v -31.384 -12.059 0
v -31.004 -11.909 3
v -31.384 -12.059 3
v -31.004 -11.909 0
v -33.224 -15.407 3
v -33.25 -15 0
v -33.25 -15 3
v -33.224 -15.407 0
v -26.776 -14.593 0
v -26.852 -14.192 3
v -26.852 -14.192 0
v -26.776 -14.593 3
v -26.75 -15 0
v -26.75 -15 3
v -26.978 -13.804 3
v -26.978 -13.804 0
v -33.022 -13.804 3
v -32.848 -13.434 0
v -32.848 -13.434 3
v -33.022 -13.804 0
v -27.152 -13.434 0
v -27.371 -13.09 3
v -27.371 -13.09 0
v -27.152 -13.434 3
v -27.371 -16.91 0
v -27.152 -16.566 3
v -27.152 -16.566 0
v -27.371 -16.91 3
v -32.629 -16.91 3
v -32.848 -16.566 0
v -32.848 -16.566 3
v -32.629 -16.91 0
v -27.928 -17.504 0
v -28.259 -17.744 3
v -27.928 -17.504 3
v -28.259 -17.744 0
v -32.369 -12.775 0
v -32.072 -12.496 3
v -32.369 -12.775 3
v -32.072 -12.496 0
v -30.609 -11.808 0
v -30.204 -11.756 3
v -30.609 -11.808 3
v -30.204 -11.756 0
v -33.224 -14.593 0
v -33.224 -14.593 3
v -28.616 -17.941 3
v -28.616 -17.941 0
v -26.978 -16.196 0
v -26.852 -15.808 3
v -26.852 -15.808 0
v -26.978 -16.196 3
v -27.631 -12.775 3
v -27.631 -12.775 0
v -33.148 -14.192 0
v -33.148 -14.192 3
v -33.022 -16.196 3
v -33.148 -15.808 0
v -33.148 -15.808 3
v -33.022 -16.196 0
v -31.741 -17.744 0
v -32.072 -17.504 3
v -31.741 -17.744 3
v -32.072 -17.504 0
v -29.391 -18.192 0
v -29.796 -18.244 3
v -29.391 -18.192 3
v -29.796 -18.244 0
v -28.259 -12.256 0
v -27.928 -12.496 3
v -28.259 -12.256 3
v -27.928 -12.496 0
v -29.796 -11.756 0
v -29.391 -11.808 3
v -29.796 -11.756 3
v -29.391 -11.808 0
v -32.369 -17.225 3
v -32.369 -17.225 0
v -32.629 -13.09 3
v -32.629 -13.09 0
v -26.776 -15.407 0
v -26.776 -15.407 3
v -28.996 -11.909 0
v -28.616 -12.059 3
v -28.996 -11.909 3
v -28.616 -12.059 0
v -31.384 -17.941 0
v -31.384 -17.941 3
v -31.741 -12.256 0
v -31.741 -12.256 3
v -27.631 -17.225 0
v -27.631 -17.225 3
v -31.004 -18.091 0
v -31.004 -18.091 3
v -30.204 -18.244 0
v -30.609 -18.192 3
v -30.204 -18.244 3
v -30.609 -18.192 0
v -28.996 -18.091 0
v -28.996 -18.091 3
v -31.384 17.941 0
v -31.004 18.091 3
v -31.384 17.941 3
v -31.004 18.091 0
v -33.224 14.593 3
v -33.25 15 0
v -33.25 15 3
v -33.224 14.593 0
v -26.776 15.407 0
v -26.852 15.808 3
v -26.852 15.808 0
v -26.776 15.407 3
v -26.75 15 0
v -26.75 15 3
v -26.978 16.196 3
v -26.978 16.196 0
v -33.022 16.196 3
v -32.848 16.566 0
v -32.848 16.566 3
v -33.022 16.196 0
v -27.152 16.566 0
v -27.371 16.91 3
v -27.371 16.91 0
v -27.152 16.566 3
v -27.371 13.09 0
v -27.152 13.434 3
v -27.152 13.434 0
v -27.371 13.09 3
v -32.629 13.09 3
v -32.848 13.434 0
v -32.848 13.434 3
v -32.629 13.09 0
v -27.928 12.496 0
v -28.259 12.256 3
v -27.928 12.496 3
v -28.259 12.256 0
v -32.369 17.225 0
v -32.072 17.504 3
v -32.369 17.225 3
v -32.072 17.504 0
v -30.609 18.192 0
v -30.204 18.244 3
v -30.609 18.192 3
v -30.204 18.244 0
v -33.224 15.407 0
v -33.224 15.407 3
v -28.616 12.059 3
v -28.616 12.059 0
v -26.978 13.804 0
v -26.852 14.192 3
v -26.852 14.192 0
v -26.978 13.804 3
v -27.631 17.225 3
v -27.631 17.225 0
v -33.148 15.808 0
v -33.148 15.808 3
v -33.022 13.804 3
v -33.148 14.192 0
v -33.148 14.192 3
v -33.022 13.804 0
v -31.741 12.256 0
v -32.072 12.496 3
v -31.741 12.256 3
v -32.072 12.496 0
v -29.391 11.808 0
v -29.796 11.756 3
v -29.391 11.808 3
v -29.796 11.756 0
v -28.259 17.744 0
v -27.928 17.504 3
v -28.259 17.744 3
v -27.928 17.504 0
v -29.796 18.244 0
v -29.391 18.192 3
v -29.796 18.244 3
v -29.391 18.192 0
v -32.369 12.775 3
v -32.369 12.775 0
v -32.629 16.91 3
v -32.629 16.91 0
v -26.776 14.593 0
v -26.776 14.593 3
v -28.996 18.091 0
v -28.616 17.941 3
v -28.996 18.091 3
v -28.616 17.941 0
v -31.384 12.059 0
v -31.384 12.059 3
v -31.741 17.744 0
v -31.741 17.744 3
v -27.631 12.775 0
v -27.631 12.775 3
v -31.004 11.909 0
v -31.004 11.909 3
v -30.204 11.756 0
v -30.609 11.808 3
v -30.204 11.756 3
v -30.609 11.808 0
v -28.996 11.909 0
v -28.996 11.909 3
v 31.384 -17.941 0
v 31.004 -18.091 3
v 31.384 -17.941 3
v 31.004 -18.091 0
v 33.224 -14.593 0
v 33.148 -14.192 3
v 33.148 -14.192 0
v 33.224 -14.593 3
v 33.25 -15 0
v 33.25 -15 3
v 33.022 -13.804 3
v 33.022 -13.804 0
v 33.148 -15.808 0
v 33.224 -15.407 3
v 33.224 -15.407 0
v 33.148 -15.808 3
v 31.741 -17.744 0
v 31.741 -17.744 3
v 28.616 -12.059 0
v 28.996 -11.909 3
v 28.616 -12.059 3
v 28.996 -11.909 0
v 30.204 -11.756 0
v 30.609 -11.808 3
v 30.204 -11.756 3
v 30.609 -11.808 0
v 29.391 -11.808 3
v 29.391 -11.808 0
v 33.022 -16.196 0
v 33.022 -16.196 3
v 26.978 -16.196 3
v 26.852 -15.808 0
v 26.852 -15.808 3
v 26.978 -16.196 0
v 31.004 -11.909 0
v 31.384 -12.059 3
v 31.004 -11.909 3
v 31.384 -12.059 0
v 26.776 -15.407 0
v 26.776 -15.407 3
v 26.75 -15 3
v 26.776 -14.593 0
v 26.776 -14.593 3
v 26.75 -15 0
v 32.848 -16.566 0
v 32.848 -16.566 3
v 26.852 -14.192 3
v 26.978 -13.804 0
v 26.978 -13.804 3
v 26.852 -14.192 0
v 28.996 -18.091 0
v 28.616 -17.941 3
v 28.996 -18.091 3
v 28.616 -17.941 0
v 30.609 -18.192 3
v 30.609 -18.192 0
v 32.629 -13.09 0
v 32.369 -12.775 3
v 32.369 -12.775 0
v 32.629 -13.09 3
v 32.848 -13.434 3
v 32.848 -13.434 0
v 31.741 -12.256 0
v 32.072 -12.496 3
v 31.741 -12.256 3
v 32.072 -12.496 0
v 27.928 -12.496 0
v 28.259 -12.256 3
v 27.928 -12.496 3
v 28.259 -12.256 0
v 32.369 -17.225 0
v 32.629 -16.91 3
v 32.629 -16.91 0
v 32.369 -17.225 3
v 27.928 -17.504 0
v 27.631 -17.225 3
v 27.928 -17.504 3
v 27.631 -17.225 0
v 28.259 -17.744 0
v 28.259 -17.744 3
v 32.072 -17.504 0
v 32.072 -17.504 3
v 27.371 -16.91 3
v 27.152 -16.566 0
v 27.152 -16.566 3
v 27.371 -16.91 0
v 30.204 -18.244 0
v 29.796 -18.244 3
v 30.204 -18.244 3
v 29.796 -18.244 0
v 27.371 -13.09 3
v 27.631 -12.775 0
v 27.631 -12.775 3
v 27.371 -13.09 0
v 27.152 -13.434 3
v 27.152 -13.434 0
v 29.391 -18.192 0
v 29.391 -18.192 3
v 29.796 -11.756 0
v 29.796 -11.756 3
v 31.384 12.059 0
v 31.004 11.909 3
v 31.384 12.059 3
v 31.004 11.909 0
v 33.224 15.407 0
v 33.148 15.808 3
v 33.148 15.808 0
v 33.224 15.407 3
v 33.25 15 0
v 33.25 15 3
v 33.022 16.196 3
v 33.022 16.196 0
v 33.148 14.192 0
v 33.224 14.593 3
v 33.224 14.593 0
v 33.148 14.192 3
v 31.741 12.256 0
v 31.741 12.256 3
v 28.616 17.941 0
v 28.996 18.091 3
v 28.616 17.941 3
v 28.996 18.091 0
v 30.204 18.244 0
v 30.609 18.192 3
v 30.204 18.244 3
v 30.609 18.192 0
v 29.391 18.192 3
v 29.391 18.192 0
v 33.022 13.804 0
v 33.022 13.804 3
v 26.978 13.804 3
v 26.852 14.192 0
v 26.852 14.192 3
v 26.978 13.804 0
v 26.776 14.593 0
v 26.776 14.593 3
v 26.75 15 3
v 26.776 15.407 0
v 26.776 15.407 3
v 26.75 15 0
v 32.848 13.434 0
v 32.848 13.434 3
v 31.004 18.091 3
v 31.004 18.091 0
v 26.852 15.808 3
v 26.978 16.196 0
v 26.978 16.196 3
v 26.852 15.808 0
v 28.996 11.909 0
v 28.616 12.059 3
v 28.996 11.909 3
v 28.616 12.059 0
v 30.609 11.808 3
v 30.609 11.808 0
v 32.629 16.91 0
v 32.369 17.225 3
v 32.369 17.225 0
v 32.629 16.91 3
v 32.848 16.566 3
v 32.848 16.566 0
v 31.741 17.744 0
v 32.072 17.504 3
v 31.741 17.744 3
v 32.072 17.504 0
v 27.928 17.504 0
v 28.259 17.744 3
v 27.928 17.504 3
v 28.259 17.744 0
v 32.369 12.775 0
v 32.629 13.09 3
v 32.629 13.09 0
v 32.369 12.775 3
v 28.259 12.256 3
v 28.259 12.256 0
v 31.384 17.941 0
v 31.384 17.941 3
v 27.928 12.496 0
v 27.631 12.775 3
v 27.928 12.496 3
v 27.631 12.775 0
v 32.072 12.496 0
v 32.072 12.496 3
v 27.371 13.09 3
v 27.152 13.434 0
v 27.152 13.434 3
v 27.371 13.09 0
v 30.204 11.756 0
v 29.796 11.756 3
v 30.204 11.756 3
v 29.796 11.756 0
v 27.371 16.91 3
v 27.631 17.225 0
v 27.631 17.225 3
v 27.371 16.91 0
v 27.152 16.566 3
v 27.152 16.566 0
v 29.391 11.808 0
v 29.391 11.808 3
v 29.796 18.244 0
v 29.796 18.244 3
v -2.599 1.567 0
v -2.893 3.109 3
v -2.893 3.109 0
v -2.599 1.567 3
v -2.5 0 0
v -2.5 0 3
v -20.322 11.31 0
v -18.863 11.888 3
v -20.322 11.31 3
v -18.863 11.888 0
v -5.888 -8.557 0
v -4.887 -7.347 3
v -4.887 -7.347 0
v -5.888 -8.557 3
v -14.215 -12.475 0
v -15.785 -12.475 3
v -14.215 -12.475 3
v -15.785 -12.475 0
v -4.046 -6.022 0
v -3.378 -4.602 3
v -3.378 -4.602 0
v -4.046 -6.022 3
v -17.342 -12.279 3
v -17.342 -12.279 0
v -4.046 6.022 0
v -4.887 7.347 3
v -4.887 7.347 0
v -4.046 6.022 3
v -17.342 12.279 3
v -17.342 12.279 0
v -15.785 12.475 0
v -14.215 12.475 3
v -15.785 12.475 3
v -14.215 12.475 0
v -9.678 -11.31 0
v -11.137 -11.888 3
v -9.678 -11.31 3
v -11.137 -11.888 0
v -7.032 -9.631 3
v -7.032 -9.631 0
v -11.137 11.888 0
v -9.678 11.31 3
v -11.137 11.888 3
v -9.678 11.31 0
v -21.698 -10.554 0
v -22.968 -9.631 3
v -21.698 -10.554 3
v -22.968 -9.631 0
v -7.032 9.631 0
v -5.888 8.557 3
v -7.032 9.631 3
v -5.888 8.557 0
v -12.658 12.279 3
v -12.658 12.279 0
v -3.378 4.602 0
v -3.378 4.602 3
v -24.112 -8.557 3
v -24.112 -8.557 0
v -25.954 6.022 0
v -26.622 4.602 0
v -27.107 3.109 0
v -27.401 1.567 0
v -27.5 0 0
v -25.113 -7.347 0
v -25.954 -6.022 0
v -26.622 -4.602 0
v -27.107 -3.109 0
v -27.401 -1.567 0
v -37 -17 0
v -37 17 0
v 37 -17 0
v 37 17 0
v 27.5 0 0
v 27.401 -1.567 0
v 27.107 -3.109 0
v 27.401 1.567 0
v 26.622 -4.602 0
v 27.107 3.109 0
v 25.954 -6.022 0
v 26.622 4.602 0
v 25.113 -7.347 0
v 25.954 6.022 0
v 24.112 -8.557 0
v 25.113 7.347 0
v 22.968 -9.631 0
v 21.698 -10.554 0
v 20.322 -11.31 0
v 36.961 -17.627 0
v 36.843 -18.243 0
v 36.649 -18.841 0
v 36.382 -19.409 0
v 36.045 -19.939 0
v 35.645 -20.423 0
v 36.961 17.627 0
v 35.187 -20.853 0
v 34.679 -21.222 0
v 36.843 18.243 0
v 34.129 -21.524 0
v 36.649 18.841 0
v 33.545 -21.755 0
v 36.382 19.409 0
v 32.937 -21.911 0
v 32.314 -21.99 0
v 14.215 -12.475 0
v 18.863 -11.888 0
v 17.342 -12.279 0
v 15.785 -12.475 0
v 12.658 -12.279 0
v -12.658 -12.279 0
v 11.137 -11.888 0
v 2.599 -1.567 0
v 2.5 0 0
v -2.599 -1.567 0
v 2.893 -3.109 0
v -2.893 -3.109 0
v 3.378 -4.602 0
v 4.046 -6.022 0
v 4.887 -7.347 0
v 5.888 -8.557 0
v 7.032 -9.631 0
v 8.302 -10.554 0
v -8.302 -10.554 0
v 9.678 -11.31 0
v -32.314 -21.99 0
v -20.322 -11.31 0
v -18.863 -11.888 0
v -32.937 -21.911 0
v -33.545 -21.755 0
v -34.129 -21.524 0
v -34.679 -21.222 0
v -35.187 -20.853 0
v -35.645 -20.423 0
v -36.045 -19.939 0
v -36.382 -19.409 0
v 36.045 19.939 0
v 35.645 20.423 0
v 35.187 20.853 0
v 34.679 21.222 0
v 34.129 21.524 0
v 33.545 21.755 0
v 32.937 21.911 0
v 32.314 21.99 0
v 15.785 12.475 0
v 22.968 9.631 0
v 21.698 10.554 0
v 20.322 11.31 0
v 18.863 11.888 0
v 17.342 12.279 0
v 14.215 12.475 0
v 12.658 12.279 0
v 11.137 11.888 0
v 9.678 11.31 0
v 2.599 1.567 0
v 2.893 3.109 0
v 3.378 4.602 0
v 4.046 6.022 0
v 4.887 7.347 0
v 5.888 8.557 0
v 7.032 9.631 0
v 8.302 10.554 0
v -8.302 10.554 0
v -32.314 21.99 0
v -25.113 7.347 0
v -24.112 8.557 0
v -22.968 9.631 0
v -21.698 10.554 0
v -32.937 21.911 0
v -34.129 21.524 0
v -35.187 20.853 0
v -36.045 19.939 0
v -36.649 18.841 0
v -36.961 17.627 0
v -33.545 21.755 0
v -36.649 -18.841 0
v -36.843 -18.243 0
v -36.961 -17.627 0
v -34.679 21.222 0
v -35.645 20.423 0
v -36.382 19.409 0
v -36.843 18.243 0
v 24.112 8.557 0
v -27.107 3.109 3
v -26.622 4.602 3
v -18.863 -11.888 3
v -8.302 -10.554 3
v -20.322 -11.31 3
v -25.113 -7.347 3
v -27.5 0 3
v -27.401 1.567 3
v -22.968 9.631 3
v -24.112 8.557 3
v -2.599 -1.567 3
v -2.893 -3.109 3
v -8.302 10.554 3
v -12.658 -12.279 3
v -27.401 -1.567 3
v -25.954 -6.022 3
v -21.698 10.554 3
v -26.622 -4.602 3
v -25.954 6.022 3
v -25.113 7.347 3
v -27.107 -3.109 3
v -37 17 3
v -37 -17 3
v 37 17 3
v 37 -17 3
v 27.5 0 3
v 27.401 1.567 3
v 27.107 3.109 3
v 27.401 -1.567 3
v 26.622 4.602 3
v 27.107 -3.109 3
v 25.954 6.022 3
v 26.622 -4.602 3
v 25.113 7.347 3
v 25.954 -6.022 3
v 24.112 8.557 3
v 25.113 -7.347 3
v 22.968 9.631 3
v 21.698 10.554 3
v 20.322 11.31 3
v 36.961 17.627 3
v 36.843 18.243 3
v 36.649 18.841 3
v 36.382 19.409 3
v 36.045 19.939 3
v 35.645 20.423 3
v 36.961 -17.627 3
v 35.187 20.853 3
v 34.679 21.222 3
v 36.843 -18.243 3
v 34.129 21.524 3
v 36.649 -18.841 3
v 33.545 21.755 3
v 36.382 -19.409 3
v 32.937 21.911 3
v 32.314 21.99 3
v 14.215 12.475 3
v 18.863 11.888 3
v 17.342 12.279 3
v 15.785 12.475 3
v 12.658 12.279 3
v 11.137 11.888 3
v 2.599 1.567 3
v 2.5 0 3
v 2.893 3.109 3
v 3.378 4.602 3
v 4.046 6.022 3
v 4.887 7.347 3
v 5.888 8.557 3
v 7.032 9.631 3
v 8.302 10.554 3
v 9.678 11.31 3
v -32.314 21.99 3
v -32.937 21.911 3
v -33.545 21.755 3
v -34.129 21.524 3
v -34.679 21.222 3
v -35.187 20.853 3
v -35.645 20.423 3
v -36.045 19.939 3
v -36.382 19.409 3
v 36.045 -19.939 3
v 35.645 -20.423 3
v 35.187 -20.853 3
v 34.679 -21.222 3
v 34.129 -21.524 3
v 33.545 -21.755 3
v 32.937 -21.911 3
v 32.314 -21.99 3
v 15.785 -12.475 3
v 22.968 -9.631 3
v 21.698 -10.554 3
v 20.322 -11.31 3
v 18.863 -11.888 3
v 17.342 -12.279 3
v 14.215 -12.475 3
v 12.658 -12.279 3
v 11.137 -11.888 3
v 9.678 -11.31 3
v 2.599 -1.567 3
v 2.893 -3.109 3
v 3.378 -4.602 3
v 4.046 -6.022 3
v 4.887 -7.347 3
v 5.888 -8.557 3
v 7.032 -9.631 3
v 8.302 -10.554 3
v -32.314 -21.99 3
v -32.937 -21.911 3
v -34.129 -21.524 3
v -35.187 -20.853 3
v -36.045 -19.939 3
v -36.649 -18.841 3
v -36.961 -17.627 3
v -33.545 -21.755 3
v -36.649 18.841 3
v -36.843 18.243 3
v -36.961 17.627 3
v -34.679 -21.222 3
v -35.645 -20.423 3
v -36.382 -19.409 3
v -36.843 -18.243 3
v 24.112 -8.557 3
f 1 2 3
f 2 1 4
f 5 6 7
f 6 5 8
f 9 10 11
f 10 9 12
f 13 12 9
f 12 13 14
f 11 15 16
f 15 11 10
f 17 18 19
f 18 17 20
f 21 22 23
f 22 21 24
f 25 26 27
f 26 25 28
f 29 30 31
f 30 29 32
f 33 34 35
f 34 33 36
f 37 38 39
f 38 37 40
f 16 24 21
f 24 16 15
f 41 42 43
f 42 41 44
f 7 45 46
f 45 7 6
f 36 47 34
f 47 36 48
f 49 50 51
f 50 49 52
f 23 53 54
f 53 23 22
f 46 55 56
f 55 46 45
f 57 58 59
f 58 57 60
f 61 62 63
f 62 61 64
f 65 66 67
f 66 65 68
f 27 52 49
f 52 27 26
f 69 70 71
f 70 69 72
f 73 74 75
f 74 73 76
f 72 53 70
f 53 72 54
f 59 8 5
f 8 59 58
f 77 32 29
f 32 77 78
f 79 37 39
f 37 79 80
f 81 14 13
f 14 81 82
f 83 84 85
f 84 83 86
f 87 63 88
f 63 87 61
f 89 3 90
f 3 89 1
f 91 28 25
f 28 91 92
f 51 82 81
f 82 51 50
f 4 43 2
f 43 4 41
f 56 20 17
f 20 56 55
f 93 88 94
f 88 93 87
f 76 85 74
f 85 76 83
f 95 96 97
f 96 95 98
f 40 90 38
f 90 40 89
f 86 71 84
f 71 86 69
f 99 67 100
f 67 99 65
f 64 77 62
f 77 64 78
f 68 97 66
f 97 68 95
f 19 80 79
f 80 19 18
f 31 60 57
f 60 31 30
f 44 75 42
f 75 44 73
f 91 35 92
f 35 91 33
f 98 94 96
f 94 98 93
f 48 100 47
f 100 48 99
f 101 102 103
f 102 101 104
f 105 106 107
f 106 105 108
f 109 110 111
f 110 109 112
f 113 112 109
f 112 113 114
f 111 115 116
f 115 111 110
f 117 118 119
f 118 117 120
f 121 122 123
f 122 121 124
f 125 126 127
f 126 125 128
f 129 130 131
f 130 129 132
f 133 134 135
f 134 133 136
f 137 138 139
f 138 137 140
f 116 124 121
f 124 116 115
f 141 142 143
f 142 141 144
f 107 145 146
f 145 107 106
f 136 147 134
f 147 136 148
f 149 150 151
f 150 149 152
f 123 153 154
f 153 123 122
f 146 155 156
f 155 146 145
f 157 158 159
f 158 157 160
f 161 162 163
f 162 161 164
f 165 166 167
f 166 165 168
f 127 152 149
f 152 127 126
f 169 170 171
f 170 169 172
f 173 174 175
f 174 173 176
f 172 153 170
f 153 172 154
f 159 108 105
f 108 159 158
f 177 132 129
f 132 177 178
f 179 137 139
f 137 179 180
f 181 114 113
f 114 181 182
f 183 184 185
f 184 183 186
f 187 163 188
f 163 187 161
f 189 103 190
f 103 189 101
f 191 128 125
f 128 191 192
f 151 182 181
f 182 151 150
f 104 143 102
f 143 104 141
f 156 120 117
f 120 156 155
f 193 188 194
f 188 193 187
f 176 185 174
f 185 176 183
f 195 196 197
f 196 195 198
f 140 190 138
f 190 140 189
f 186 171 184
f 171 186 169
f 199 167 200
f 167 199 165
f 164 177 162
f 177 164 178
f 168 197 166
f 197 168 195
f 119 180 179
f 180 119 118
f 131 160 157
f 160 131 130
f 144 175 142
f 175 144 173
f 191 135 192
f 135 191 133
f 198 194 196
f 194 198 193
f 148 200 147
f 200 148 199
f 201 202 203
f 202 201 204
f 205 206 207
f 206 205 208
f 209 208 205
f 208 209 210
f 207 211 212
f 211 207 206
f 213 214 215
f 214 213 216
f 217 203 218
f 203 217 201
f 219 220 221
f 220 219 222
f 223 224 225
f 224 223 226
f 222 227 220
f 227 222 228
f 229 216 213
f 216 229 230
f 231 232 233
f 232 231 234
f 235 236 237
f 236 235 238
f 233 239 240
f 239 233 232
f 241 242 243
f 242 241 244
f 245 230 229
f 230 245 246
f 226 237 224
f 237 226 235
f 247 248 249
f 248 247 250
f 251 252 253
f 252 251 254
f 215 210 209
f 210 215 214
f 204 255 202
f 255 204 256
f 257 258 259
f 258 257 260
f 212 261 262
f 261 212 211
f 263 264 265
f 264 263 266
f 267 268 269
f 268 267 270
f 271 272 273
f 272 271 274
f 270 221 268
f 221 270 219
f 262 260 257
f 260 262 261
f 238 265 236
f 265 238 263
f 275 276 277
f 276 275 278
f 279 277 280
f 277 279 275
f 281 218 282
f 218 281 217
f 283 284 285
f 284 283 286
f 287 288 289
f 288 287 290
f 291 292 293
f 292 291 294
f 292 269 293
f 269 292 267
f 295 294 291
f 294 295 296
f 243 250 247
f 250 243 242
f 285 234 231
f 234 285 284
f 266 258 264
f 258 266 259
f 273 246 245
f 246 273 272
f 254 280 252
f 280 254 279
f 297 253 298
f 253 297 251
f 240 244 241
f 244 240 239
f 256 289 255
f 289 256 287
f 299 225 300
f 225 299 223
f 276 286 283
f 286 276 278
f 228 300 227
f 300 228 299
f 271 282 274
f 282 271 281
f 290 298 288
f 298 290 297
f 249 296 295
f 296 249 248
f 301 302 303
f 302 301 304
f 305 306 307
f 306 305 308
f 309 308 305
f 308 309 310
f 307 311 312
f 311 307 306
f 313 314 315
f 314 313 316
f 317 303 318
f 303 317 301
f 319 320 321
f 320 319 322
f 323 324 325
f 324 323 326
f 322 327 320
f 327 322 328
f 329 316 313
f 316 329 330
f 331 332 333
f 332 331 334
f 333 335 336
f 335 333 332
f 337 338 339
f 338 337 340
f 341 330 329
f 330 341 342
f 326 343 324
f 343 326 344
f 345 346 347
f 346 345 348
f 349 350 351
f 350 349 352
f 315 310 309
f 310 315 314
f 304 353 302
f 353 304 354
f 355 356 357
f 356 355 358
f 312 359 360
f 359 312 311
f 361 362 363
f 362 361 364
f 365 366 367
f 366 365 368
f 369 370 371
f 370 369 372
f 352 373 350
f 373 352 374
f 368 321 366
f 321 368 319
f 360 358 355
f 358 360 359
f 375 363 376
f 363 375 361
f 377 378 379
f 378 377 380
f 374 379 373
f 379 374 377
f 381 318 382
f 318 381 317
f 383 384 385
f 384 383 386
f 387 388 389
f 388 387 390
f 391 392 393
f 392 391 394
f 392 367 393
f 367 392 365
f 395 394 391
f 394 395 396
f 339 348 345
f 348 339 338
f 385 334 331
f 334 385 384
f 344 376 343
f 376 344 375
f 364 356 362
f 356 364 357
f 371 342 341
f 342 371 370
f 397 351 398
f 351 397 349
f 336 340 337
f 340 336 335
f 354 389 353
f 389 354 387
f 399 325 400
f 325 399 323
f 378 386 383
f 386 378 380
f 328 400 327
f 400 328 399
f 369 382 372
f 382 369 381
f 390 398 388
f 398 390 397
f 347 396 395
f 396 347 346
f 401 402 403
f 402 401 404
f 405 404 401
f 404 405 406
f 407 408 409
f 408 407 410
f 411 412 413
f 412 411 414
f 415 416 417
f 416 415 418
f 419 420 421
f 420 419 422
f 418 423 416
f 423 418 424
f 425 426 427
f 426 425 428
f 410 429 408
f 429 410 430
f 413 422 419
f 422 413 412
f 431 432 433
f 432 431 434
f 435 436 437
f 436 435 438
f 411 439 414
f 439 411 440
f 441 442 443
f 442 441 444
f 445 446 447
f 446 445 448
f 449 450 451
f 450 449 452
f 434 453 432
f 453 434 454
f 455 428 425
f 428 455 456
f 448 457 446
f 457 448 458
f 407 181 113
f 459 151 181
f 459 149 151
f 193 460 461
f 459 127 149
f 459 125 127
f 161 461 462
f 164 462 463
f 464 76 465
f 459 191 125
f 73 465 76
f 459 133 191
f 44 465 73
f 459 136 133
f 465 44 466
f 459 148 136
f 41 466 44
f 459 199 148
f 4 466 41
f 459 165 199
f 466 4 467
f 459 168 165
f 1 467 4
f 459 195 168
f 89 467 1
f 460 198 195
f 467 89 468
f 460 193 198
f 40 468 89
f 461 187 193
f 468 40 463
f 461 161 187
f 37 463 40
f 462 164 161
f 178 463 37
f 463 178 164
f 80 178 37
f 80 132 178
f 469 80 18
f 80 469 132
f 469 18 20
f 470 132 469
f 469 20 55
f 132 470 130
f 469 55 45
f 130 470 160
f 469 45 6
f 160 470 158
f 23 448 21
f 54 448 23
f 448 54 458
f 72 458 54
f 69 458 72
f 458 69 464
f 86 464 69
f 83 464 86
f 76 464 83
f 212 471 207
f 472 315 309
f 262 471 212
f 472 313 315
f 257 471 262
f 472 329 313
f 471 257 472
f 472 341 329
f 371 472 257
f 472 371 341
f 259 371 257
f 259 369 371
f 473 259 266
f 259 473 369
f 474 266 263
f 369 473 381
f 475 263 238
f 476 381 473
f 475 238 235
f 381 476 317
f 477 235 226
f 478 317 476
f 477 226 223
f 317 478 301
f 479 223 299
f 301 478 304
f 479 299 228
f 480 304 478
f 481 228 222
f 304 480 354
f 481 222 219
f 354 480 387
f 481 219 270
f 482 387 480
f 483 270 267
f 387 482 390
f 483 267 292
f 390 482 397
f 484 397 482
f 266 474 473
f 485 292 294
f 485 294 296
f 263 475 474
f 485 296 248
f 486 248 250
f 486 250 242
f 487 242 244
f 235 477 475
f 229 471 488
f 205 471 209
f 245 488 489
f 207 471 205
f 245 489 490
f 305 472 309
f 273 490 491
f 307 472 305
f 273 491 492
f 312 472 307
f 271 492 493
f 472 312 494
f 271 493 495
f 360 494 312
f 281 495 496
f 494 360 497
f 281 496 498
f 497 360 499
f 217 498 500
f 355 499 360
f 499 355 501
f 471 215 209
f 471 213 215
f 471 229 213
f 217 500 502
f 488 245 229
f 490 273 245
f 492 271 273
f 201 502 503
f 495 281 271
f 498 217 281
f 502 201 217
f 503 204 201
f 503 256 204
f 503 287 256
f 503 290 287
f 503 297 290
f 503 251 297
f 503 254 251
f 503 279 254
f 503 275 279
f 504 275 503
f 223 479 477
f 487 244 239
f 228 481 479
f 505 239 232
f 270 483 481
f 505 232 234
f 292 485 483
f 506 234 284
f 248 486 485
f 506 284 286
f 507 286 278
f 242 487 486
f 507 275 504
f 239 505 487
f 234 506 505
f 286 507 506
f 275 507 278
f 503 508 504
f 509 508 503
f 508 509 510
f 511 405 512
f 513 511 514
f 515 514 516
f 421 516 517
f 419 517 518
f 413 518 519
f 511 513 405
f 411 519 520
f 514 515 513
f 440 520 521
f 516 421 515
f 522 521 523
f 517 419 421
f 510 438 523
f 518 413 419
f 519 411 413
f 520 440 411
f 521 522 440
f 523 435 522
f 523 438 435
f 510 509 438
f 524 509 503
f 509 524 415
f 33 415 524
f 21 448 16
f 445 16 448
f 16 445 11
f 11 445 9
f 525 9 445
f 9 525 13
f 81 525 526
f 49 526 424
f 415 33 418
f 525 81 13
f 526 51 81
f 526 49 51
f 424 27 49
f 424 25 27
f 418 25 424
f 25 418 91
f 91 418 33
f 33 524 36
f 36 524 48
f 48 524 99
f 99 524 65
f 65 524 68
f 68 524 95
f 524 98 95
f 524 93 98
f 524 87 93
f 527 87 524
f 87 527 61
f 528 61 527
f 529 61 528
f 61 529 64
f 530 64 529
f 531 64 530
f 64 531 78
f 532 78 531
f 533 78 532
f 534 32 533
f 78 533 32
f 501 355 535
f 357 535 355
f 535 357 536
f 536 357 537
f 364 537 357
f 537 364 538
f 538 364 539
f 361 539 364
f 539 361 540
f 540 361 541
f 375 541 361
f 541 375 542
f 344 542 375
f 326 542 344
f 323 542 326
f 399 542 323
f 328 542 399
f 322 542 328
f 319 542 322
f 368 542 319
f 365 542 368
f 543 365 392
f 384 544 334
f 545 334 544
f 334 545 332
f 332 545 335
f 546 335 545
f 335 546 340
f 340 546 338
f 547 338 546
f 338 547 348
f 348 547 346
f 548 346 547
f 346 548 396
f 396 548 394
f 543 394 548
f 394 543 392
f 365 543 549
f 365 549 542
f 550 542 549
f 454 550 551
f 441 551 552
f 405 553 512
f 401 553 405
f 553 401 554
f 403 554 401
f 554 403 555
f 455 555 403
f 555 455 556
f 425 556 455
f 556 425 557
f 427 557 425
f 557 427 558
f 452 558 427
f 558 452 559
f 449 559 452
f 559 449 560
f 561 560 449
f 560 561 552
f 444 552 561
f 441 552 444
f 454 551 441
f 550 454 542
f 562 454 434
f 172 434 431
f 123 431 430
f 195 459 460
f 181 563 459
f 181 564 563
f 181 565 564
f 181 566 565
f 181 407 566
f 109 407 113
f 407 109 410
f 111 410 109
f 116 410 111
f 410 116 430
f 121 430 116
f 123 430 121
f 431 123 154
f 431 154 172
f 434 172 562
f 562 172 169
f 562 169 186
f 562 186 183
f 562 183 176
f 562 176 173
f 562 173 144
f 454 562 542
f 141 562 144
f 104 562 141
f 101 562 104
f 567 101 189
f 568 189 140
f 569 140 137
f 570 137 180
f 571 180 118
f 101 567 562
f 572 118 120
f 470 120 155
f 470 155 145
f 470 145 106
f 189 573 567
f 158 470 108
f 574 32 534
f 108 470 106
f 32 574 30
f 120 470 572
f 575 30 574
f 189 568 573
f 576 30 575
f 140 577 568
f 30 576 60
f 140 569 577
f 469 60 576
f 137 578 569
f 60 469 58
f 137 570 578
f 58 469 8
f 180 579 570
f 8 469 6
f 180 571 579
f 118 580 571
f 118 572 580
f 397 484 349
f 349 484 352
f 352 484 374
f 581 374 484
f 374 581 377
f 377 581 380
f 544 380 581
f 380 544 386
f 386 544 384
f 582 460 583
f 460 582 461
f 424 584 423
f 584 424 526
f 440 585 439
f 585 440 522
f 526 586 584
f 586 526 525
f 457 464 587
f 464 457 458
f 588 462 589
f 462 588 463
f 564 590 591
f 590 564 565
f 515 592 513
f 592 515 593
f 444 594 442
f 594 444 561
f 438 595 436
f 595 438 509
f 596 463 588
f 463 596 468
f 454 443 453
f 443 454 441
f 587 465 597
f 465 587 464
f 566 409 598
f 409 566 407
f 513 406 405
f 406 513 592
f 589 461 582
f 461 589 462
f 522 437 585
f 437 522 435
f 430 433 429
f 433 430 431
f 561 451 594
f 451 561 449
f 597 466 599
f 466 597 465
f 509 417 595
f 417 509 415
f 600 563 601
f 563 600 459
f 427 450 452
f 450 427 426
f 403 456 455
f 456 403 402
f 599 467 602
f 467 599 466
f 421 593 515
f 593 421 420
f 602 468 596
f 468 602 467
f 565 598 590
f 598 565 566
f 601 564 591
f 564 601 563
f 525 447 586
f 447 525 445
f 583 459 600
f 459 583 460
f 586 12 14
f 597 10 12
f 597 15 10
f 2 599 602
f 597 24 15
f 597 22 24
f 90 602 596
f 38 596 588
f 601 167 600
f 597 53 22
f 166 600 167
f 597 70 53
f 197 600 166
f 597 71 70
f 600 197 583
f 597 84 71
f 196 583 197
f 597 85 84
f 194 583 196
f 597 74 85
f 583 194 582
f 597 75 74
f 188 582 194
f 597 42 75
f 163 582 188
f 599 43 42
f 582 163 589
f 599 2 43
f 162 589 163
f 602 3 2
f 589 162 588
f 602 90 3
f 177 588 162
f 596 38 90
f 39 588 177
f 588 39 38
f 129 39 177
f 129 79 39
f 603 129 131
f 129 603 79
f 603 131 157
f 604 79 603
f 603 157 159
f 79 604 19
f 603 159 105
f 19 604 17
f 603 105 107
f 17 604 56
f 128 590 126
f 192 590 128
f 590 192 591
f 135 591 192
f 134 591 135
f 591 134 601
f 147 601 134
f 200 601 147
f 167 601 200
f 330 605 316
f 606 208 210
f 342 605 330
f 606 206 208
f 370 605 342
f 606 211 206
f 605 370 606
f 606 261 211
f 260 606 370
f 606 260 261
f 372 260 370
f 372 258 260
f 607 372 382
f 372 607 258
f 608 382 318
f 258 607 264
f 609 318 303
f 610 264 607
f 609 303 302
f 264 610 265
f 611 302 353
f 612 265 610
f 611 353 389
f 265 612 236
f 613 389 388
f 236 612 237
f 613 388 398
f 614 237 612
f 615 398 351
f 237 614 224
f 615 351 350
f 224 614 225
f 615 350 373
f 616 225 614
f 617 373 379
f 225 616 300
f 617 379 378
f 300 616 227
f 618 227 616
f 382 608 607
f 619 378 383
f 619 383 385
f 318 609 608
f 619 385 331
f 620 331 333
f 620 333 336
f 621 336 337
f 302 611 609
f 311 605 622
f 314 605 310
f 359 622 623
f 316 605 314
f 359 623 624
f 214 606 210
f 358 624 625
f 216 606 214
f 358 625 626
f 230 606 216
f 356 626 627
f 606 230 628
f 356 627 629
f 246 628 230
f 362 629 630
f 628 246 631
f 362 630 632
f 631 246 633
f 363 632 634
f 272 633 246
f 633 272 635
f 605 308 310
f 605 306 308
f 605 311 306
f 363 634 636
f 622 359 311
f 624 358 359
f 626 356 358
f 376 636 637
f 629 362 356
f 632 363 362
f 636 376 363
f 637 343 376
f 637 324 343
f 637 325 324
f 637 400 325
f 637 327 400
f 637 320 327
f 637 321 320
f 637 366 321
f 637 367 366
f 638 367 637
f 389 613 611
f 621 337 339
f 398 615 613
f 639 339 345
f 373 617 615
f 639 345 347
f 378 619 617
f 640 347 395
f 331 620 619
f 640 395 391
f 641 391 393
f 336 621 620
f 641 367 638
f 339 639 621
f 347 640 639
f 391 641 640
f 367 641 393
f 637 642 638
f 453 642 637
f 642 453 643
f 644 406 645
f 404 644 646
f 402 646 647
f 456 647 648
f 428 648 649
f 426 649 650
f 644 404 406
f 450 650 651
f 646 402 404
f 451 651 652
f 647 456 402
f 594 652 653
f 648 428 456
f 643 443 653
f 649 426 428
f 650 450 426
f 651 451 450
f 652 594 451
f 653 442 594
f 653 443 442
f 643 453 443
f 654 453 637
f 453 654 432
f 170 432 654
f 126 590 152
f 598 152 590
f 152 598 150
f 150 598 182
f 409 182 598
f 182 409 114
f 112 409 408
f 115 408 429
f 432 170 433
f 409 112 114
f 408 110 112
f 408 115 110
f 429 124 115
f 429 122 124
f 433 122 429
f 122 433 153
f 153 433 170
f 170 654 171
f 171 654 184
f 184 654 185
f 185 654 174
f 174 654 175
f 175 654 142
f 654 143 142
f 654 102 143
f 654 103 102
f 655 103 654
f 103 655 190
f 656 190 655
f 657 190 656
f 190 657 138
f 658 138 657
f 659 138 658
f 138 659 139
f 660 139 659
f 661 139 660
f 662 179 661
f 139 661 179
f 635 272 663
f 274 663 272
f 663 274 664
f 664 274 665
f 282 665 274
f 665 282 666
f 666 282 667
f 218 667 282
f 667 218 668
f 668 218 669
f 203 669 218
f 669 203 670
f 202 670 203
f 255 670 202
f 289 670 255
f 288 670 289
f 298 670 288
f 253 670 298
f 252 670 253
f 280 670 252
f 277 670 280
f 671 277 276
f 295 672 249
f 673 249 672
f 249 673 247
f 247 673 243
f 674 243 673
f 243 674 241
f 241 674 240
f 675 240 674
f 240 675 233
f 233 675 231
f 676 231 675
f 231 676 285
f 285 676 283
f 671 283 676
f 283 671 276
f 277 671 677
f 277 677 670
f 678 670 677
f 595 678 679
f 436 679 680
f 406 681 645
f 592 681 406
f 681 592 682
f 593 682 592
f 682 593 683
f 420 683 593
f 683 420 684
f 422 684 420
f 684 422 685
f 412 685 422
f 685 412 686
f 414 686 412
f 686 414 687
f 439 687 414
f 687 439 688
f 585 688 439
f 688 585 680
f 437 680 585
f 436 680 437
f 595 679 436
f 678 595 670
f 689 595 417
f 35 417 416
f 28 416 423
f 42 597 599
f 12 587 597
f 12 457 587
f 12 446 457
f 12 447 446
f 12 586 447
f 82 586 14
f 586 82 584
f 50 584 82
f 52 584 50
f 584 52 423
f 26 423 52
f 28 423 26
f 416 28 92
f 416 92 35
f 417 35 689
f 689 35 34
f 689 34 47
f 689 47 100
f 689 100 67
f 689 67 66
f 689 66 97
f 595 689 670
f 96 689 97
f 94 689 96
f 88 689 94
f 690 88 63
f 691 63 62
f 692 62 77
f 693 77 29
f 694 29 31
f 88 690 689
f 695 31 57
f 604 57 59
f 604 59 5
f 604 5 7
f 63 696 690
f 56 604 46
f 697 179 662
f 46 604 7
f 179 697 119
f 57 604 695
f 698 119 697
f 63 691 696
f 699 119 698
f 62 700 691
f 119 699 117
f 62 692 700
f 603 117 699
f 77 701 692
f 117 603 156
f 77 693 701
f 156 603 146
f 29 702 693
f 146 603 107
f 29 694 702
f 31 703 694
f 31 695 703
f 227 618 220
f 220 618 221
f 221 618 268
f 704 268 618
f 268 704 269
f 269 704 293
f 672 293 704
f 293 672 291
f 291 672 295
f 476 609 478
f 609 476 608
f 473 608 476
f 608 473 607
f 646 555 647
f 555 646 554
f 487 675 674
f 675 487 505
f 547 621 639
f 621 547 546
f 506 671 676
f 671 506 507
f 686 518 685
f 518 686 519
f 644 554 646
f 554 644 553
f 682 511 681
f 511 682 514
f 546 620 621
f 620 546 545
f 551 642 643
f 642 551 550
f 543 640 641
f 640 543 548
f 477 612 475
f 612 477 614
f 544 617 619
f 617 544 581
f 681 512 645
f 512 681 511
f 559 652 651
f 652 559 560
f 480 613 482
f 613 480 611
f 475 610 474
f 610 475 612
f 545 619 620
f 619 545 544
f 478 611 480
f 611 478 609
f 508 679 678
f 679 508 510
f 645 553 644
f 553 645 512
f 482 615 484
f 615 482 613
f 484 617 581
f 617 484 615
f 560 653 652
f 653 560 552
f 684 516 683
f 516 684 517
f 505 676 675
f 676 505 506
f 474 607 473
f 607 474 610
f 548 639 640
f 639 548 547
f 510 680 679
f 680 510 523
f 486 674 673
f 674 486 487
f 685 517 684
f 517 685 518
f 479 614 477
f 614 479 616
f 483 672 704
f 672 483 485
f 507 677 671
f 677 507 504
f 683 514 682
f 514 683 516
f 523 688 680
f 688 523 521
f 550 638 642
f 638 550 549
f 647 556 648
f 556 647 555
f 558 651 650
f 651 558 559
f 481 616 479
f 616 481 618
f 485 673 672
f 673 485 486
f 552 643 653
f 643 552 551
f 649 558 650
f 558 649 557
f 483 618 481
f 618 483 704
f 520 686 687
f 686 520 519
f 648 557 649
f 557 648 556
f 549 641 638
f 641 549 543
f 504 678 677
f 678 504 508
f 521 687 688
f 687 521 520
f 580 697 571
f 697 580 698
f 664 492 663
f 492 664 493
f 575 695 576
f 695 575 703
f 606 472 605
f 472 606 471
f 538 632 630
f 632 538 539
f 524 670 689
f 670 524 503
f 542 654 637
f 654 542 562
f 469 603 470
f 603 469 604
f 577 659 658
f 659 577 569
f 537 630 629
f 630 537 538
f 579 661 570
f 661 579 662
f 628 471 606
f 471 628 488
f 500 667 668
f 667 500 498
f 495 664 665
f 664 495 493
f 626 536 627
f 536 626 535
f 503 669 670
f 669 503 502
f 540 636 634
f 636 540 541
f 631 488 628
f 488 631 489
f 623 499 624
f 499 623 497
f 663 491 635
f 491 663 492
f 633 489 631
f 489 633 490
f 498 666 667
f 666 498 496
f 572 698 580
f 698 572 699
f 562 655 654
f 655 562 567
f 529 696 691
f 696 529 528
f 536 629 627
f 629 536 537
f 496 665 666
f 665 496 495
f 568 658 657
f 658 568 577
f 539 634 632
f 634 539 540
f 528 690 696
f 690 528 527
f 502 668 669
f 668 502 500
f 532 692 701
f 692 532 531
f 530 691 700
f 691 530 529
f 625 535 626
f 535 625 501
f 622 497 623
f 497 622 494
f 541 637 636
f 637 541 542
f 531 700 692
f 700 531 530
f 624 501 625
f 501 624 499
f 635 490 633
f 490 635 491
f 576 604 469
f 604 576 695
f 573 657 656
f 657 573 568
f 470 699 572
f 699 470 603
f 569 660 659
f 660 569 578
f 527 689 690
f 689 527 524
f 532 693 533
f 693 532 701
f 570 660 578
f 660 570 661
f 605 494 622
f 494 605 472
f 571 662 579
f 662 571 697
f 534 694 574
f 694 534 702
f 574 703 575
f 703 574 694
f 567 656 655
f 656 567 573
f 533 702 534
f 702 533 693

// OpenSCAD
$fn = 50;

difference() {
	union() {
		hull() {
			translate(v = [-32.0, 17.0, 0]) {
				cylinder(h = 3, r = 5);
			}
			translate(v = [32.0, 17.0, 0]) {
				cylinder(h = 3, r = 5);
			}
			translate(v = [-32.0, -17.0, 0]) {
				cylinder(h = 3, r = 5);
			}
			translate(v = [32.0, -17.0, 0]) {
				cylinder(h = 3, r = 5);
			}
		}
	}
	union() {
		translate(v = [-30.0, -15.0, -100.0]) {
			cylinder(h = 200, r = 3.25);
		}
		translate(v = [-30.0, 15.0, -100.0]) {
			cylinder(h = 200, r = 3.25);
		}
		translate(v = [30.0, -15.0, -100.0]) {
			cylinder(h = 200, r = 3.25);
		}
		translate(v = [30.0, 15.0, -100.0]) {
			cylinder(h = 200, r = 3.25);
		}
		translate(v = [-30.0, -15.0, -100.0]) {
			cylinder(h = 200, r = 1.8);
		}
		translate(v = [-30.0, 15.0, -100.0]) {
			cylinder(h = 200, r = 1.8);
		}
		translate(v = [30.0, -15.0, -100.0]) {
			cylinder(h = 200, r = 1.8);
		}
		translate(v = [30.0, 15.0, -100.0]) {
			cylinder(h = 200, r = 1.8);
		}
		translate(v = [-15.0, 0, 0.0]) {
			cylinder(h = 3, r = 12.5);
		}
		translate(v = [15.0, 0, 0.0]) {
			cylinder(h = 3, r = 12.5);
		}
	}
}
